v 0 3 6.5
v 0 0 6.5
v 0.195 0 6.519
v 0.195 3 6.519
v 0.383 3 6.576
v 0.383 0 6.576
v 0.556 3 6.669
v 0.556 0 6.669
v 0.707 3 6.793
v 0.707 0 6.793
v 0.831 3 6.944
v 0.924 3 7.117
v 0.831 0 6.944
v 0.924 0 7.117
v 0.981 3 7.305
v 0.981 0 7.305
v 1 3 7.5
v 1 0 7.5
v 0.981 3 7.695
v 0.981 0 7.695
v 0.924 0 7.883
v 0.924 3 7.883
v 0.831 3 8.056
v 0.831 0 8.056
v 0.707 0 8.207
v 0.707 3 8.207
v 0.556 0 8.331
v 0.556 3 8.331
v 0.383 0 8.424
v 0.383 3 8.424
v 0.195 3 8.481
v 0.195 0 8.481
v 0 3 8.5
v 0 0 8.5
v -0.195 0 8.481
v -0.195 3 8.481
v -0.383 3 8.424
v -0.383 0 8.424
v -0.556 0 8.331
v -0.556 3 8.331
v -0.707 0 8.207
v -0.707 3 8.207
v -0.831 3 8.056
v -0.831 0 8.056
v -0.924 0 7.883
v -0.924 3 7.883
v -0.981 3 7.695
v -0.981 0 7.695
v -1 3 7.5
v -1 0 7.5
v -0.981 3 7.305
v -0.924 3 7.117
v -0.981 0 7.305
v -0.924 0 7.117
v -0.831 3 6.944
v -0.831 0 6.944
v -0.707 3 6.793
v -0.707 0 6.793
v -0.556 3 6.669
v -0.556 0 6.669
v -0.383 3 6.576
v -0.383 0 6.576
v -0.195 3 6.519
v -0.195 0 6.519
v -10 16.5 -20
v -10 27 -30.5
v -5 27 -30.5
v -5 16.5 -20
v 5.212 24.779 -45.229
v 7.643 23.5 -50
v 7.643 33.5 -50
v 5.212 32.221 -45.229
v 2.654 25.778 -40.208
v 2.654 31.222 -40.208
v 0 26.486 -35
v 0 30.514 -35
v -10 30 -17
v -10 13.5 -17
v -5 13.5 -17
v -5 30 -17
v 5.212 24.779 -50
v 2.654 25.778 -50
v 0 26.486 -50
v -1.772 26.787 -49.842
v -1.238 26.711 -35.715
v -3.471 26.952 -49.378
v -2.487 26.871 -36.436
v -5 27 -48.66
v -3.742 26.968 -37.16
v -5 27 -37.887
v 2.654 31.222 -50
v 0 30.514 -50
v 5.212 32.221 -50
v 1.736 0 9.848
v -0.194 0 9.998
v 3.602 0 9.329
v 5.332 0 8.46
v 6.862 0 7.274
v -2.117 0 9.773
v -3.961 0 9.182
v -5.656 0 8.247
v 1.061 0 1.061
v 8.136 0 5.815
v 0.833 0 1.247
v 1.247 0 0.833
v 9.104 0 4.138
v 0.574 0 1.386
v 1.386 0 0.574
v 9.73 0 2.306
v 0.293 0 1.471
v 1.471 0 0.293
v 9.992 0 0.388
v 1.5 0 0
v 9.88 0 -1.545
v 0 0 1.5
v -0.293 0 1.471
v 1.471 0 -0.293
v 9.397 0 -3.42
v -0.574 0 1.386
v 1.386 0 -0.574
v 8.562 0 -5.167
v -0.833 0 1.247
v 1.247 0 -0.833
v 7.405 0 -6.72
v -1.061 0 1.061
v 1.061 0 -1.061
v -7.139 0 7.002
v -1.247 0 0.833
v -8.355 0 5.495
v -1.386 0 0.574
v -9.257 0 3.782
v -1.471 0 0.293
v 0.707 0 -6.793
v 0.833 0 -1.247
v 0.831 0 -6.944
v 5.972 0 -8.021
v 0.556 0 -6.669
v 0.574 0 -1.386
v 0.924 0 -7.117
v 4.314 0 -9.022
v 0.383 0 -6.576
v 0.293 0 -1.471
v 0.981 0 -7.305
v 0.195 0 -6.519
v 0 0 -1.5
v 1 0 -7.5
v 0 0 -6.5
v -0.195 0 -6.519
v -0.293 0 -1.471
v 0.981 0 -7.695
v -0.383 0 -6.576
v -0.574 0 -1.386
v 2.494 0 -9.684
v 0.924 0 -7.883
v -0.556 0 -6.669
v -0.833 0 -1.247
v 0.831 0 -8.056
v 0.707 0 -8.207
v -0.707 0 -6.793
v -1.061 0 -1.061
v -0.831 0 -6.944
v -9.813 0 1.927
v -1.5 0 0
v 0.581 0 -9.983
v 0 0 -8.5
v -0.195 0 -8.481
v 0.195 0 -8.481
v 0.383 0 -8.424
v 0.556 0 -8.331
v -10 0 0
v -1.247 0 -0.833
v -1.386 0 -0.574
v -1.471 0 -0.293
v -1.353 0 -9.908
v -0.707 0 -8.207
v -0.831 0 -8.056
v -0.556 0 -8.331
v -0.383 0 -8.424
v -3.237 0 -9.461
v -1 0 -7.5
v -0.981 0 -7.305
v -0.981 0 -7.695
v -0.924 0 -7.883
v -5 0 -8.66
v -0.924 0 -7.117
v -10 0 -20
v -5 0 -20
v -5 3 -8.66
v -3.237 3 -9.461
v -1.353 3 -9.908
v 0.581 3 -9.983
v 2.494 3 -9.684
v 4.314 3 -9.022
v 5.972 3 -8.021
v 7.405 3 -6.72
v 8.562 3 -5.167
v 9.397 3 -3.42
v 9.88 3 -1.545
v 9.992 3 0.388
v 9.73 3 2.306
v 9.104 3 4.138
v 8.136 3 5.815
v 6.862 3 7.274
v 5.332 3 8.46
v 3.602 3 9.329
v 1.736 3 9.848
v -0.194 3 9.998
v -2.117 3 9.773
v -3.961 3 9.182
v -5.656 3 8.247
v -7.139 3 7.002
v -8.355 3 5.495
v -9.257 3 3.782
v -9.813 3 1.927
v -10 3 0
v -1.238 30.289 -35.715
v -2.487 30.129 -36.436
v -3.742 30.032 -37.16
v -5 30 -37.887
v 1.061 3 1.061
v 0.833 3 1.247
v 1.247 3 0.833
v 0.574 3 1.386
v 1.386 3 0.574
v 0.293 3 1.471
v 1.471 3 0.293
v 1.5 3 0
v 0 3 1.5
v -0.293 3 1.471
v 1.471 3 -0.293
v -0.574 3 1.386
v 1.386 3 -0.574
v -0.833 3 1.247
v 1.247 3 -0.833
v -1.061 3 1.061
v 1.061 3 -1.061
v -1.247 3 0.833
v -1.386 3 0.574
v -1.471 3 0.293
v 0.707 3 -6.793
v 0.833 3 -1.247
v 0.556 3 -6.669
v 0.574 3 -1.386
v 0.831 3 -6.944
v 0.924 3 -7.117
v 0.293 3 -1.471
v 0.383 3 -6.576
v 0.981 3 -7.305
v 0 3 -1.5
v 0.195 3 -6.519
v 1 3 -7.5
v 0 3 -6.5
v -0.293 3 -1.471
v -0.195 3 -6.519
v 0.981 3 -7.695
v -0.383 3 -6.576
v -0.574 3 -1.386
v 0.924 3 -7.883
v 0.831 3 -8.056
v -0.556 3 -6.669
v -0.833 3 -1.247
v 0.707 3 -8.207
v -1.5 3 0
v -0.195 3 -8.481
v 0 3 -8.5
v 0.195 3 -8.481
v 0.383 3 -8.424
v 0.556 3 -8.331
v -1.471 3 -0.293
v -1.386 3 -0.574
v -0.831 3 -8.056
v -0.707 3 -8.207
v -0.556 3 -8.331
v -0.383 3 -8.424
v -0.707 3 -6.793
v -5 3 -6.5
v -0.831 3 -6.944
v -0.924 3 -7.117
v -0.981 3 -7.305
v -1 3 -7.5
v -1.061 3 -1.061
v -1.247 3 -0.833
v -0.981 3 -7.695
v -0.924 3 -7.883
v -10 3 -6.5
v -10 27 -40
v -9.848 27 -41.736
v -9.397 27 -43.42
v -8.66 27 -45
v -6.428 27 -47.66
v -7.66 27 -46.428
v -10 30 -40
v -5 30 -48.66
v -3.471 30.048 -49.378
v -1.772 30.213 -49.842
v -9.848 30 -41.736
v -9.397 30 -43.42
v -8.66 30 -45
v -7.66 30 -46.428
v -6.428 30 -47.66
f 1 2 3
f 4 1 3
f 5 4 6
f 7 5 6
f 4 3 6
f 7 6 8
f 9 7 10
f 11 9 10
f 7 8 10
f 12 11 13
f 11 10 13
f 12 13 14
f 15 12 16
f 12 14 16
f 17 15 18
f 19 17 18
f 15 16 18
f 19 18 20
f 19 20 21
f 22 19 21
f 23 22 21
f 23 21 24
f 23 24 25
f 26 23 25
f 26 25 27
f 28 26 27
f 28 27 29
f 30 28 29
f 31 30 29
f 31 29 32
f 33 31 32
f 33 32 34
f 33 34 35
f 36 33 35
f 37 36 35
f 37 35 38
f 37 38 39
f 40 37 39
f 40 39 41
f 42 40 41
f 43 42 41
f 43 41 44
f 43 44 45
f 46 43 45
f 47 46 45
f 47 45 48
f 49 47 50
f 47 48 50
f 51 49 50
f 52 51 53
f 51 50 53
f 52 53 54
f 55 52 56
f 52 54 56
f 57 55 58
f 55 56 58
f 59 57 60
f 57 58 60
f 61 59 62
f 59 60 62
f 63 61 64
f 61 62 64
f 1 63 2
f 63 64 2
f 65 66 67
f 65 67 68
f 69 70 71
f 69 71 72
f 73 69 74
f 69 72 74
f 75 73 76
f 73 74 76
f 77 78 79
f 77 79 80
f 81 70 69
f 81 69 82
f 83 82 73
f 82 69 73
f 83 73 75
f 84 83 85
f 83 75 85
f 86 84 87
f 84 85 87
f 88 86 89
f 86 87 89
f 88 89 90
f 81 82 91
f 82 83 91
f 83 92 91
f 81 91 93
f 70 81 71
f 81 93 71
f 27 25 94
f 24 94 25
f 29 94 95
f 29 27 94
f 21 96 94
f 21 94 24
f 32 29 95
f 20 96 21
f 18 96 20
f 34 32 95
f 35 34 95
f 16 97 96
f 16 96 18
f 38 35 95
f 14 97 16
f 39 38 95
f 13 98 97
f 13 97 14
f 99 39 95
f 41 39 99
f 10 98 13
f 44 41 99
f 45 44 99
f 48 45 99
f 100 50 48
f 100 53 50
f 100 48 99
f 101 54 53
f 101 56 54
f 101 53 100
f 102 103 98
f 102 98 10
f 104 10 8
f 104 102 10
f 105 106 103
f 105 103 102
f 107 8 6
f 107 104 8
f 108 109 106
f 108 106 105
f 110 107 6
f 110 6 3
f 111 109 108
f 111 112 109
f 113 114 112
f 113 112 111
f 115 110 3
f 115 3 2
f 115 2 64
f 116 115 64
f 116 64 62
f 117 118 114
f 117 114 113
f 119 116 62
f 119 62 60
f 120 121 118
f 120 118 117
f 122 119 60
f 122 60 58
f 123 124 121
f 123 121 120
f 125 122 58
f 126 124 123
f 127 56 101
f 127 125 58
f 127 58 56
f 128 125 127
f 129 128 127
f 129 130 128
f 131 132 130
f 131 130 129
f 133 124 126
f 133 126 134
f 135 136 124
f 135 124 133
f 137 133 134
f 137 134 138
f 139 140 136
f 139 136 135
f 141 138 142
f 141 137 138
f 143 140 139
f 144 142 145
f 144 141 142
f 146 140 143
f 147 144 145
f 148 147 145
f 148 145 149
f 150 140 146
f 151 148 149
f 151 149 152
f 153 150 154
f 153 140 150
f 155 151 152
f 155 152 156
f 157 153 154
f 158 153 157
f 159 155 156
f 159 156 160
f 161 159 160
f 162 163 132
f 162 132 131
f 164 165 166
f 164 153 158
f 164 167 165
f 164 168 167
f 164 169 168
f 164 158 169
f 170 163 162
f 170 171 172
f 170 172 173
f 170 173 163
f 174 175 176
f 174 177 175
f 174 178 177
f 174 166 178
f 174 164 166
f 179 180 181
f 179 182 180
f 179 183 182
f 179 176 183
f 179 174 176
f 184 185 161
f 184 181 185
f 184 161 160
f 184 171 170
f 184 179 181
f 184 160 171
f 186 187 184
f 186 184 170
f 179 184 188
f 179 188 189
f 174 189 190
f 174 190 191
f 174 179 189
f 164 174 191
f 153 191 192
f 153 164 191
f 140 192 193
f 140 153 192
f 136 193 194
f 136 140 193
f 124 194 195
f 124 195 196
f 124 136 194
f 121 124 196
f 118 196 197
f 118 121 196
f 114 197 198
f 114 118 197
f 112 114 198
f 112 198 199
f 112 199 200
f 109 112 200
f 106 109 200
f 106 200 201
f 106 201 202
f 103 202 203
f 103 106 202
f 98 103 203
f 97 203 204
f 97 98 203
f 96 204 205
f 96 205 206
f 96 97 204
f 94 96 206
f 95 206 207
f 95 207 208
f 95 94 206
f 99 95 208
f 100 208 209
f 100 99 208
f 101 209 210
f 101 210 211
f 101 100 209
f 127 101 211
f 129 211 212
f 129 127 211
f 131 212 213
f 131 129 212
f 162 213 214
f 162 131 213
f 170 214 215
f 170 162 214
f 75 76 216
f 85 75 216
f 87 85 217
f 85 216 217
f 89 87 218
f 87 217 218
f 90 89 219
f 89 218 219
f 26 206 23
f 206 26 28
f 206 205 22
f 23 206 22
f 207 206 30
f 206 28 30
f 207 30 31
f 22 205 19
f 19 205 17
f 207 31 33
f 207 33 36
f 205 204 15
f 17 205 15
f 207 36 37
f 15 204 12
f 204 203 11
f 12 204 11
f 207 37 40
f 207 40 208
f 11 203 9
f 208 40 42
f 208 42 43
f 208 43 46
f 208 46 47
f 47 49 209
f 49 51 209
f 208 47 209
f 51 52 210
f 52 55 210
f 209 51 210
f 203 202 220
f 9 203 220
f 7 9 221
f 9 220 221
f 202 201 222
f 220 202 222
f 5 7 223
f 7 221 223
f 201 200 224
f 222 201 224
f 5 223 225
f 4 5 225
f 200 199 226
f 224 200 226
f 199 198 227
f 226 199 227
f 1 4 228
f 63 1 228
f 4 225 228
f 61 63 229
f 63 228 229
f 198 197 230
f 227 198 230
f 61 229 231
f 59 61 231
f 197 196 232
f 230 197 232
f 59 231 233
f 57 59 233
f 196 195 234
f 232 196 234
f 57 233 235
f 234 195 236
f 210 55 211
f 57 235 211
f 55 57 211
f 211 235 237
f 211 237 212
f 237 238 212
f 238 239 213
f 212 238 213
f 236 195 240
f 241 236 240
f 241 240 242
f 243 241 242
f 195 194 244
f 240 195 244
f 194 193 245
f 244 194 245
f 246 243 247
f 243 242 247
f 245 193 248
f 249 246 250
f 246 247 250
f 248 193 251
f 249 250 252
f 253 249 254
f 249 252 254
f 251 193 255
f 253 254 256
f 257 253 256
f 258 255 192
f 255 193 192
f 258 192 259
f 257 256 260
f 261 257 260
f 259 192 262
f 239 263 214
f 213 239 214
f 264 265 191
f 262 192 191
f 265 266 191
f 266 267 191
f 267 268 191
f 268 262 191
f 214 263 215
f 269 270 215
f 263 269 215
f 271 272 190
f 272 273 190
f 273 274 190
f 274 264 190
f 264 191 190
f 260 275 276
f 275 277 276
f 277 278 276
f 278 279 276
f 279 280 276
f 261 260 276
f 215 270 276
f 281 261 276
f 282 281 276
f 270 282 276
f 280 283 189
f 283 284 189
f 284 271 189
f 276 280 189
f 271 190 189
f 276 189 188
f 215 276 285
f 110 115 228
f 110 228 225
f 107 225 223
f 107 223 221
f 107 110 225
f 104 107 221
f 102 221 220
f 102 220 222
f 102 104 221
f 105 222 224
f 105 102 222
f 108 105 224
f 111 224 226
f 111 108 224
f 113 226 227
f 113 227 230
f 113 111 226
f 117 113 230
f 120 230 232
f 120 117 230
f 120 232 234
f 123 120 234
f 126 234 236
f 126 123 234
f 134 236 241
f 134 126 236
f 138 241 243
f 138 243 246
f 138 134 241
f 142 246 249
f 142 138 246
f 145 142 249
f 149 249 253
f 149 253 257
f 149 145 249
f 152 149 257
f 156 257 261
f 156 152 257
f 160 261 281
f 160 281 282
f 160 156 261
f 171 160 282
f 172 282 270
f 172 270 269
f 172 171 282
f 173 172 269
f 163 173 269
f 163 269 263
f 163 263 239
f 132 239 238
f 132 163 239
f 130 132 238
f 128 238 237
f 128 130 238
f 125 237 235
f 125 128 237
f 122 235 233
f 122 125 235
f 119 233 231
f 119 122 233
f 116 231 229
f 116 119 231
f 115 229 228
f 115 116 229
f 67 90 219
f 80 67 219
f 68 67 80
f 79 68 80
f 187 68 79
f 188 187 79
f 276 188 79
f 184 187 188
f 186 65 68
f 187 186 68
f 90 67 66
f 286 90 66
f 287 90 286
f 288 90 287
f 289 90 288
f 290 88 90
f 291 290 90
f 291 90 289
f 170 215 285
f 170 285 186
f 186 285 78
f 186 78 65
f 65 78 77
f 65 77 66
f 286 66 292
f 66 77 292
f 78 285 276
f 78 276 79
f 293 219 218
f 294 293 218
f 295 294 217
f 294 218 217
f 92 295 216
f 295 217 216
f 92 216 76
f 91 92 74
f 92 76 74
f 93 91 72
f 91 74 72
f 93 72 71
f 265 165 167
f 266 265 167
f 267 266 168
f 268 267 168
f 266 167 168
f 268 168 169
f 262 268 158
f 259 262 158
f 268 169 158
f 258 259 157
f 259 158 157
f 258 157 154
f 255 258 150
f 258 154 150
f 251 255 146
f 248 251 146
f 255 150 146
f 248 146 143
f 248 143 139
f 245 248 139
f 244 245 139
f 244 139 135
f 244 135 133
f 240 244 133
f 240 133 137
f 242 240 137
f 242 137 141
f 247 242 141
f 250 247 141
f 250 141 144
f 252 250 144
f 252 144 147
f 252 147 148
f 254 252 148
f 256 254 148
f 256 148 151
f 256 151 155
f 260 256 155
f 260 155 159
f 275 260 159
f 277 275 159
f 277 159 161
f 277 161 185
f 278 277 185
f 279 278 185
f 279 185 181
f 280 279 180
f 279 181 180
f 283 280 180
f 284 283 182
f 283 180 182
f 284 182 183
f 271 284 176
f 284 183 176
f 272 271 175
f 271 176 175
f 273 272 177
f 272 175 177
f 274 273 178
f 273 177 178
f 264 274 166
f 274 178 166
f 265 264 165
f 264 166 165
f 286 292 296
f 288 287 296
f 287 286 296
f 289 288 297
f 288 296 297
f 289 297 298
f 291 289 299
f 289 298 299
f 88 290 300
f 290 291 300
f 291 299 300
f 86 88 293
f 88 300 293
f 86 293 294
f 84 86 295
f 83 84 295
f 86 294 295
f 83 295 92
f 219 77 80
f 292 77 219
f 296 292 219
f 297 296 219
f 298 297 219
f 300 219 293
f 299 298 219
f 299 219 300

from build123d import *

# Parameters (mm, degrees)
SKETCH1_R           = 1.5
BOSS_EXTRUDE1_DEPTH = 3
SKETCH2_W           = 1.5
SKETCH2_H           = 3
BOSS_EXTRUDE2_DEPTH = 5
BOSS_EXTRUDE3_DEPTH = 3
BOSS_EXTRUDE4_START = -1.5
BOSS_EXTRUDE4_DEPTH = 5
SKETCH6_OUTSIDE_W   = 36.314
SKETCH6_OUTSIDE_H   = 49.814
CUT_EXTRUDE2_DEPTH  = 57.984647055
SKETCH7_R           = 1
CUT_EXTRUDE3_DEPTH  = 62.010245195


with BuildPart() as part:
    # Sketch1 → Boss-Extrude1 (new body)
    with BuildSketch(Plane(origin=(0, 0, 0), x_dir=(1, 0, 0), z_dir=(0, 1, 0))):
        with BuildLine():
            Line((-10, 0), (-10, 20))
            Line((-10, 20), (-5, 20))
            Line((-5, 20), (-5, 8.660254038))
            ThreePointArc((-5, 8.660254038), (8.660254038, -5), (-10, 0))
        make_face()
        with Locations(Location((0, 0, 0), (0, 0, 270))):
            Circle(SKETCH1_R, mode=Mode.SUBTRACT)
    extrude(amount=BOSS_EXTRUDE1_DEPTH)

    # Sketch2 → Boss-Extrude2 (add)
    with BuildSketch(Plane.ZY.offset(10)):
        with Locations((-19.25, 1.5)):
            Rectangle(SKETCH2_W, SKETCH2_H)
        Polygon((-18.5, 0), (-17, 0), (-6.5, 0), (-6.5, 3), (-18.5, 3), align=None)
        Polygon((-18.5, 30), (-18.5, 3), (-6.5, 3), (-17, 13.5), (-17, 30), align=None)
        Polygon((-20, 3), (-18.5, 3), (-18.5, 30), (-20, 30), (-30, 30), (-30, 27), (-30.5, 27), (-20, 16.5), align=None)
    extrude(amount=-BOSS_EXTRUDE2_DEPTH)

    # Sketch4 → Boss-Extrude3 (add)
    with BuildSketch(Plane(origin=(0, 30, 0), x_dir=(1, 0, 0), z_dir=(0, 1, 0))):
        with BuildLine():
            Line((-5, 17), (-10, 17))
            Line((-10, 17), (-10, 40))
            ThreePointArc((-10, 40), (-7.071067812, 47.071067812), (0, 50))
            Line((0, 50), (0, 35))
            Line((0, 35), (-5, 37.886751346))
            Line((-5, 37.886751346), (-5, 30))
            Line((-5, 30), (-5, 17))
        make_face()
    extrude(amount=-BOSS_EXTRUDE3_DEPTH)

    # Sketch5 → Boss-Extrude4 (add, symmetric)
    with BuildSketch(Plane(origin=(0, 30, 0), x_dir=(1, 0, 0), z_dir=(0, 1, 0)).offset(BOSS_EXTRUDE4_START)):
        with BuildLine():
            Line((-5, 37.886751346), (-10, 37.886751346))
            Line((-10, 37.886751346), (-10, 40))
            ThreePointArc((-10, 40), (-7.071067812, 47.071067812), (0, 50))
            Line((0, 50), (7.642881742, 50))
            Line((7.642881742, 50), (0, 35))
            Line((0, 35), (-5, 37.886751346))
        make_face()
    extrude(amount=BOSS_EXTRUDE4_DEPTH, both=True)

    # Sketch6 outside → Cut-Extrude2 (cut, through all)
    with BuildSketch(Plane.XY.offset(-35)):
        with Locations((0, 16.75)):
            Rectangle(SKETCH6_OUTSIDE_W, SKETCH6_OUTSIDE_H)
        with BuildLine():
            Line((-10, 30), (-5, 30))
            ThreePointArc((-5, 30), (1.559200766, 30.891151362), (7.642881742, 33.5))
            Line((7.642881742, 33.5), (7.642881742, 23.5))
            ThreePointArc((7.642881742, 23.5), (1.559200766, 26.108848638), (-5, 27))
            Line((-5, 27), (-10, 27))
            Line((-10, 27), (-10, 30))
        make_face(mode=Mode.SUBTRACT)
    extrude(amount=-CUT_EXTRUDE2_DEPTH, mode=Mode.SUBTRACT)

    # Sketch7 → Cut-Extrude3 (cut, through all)
    with BuildSketch(Plane.XZ):
        with Locations(Location((0, -7.5, 0), (0, 0, 270))):
            Circle(SKETCH7_R)
        with Locations(Location((0, 7.5, 0), (0, 0, 270))):
            Circle(SKETCH7_R)
    extrude(amount=-CUT_EXTRUDE3_DEPTH, mode=Mode.SUBTRACT)


solid = part.part
